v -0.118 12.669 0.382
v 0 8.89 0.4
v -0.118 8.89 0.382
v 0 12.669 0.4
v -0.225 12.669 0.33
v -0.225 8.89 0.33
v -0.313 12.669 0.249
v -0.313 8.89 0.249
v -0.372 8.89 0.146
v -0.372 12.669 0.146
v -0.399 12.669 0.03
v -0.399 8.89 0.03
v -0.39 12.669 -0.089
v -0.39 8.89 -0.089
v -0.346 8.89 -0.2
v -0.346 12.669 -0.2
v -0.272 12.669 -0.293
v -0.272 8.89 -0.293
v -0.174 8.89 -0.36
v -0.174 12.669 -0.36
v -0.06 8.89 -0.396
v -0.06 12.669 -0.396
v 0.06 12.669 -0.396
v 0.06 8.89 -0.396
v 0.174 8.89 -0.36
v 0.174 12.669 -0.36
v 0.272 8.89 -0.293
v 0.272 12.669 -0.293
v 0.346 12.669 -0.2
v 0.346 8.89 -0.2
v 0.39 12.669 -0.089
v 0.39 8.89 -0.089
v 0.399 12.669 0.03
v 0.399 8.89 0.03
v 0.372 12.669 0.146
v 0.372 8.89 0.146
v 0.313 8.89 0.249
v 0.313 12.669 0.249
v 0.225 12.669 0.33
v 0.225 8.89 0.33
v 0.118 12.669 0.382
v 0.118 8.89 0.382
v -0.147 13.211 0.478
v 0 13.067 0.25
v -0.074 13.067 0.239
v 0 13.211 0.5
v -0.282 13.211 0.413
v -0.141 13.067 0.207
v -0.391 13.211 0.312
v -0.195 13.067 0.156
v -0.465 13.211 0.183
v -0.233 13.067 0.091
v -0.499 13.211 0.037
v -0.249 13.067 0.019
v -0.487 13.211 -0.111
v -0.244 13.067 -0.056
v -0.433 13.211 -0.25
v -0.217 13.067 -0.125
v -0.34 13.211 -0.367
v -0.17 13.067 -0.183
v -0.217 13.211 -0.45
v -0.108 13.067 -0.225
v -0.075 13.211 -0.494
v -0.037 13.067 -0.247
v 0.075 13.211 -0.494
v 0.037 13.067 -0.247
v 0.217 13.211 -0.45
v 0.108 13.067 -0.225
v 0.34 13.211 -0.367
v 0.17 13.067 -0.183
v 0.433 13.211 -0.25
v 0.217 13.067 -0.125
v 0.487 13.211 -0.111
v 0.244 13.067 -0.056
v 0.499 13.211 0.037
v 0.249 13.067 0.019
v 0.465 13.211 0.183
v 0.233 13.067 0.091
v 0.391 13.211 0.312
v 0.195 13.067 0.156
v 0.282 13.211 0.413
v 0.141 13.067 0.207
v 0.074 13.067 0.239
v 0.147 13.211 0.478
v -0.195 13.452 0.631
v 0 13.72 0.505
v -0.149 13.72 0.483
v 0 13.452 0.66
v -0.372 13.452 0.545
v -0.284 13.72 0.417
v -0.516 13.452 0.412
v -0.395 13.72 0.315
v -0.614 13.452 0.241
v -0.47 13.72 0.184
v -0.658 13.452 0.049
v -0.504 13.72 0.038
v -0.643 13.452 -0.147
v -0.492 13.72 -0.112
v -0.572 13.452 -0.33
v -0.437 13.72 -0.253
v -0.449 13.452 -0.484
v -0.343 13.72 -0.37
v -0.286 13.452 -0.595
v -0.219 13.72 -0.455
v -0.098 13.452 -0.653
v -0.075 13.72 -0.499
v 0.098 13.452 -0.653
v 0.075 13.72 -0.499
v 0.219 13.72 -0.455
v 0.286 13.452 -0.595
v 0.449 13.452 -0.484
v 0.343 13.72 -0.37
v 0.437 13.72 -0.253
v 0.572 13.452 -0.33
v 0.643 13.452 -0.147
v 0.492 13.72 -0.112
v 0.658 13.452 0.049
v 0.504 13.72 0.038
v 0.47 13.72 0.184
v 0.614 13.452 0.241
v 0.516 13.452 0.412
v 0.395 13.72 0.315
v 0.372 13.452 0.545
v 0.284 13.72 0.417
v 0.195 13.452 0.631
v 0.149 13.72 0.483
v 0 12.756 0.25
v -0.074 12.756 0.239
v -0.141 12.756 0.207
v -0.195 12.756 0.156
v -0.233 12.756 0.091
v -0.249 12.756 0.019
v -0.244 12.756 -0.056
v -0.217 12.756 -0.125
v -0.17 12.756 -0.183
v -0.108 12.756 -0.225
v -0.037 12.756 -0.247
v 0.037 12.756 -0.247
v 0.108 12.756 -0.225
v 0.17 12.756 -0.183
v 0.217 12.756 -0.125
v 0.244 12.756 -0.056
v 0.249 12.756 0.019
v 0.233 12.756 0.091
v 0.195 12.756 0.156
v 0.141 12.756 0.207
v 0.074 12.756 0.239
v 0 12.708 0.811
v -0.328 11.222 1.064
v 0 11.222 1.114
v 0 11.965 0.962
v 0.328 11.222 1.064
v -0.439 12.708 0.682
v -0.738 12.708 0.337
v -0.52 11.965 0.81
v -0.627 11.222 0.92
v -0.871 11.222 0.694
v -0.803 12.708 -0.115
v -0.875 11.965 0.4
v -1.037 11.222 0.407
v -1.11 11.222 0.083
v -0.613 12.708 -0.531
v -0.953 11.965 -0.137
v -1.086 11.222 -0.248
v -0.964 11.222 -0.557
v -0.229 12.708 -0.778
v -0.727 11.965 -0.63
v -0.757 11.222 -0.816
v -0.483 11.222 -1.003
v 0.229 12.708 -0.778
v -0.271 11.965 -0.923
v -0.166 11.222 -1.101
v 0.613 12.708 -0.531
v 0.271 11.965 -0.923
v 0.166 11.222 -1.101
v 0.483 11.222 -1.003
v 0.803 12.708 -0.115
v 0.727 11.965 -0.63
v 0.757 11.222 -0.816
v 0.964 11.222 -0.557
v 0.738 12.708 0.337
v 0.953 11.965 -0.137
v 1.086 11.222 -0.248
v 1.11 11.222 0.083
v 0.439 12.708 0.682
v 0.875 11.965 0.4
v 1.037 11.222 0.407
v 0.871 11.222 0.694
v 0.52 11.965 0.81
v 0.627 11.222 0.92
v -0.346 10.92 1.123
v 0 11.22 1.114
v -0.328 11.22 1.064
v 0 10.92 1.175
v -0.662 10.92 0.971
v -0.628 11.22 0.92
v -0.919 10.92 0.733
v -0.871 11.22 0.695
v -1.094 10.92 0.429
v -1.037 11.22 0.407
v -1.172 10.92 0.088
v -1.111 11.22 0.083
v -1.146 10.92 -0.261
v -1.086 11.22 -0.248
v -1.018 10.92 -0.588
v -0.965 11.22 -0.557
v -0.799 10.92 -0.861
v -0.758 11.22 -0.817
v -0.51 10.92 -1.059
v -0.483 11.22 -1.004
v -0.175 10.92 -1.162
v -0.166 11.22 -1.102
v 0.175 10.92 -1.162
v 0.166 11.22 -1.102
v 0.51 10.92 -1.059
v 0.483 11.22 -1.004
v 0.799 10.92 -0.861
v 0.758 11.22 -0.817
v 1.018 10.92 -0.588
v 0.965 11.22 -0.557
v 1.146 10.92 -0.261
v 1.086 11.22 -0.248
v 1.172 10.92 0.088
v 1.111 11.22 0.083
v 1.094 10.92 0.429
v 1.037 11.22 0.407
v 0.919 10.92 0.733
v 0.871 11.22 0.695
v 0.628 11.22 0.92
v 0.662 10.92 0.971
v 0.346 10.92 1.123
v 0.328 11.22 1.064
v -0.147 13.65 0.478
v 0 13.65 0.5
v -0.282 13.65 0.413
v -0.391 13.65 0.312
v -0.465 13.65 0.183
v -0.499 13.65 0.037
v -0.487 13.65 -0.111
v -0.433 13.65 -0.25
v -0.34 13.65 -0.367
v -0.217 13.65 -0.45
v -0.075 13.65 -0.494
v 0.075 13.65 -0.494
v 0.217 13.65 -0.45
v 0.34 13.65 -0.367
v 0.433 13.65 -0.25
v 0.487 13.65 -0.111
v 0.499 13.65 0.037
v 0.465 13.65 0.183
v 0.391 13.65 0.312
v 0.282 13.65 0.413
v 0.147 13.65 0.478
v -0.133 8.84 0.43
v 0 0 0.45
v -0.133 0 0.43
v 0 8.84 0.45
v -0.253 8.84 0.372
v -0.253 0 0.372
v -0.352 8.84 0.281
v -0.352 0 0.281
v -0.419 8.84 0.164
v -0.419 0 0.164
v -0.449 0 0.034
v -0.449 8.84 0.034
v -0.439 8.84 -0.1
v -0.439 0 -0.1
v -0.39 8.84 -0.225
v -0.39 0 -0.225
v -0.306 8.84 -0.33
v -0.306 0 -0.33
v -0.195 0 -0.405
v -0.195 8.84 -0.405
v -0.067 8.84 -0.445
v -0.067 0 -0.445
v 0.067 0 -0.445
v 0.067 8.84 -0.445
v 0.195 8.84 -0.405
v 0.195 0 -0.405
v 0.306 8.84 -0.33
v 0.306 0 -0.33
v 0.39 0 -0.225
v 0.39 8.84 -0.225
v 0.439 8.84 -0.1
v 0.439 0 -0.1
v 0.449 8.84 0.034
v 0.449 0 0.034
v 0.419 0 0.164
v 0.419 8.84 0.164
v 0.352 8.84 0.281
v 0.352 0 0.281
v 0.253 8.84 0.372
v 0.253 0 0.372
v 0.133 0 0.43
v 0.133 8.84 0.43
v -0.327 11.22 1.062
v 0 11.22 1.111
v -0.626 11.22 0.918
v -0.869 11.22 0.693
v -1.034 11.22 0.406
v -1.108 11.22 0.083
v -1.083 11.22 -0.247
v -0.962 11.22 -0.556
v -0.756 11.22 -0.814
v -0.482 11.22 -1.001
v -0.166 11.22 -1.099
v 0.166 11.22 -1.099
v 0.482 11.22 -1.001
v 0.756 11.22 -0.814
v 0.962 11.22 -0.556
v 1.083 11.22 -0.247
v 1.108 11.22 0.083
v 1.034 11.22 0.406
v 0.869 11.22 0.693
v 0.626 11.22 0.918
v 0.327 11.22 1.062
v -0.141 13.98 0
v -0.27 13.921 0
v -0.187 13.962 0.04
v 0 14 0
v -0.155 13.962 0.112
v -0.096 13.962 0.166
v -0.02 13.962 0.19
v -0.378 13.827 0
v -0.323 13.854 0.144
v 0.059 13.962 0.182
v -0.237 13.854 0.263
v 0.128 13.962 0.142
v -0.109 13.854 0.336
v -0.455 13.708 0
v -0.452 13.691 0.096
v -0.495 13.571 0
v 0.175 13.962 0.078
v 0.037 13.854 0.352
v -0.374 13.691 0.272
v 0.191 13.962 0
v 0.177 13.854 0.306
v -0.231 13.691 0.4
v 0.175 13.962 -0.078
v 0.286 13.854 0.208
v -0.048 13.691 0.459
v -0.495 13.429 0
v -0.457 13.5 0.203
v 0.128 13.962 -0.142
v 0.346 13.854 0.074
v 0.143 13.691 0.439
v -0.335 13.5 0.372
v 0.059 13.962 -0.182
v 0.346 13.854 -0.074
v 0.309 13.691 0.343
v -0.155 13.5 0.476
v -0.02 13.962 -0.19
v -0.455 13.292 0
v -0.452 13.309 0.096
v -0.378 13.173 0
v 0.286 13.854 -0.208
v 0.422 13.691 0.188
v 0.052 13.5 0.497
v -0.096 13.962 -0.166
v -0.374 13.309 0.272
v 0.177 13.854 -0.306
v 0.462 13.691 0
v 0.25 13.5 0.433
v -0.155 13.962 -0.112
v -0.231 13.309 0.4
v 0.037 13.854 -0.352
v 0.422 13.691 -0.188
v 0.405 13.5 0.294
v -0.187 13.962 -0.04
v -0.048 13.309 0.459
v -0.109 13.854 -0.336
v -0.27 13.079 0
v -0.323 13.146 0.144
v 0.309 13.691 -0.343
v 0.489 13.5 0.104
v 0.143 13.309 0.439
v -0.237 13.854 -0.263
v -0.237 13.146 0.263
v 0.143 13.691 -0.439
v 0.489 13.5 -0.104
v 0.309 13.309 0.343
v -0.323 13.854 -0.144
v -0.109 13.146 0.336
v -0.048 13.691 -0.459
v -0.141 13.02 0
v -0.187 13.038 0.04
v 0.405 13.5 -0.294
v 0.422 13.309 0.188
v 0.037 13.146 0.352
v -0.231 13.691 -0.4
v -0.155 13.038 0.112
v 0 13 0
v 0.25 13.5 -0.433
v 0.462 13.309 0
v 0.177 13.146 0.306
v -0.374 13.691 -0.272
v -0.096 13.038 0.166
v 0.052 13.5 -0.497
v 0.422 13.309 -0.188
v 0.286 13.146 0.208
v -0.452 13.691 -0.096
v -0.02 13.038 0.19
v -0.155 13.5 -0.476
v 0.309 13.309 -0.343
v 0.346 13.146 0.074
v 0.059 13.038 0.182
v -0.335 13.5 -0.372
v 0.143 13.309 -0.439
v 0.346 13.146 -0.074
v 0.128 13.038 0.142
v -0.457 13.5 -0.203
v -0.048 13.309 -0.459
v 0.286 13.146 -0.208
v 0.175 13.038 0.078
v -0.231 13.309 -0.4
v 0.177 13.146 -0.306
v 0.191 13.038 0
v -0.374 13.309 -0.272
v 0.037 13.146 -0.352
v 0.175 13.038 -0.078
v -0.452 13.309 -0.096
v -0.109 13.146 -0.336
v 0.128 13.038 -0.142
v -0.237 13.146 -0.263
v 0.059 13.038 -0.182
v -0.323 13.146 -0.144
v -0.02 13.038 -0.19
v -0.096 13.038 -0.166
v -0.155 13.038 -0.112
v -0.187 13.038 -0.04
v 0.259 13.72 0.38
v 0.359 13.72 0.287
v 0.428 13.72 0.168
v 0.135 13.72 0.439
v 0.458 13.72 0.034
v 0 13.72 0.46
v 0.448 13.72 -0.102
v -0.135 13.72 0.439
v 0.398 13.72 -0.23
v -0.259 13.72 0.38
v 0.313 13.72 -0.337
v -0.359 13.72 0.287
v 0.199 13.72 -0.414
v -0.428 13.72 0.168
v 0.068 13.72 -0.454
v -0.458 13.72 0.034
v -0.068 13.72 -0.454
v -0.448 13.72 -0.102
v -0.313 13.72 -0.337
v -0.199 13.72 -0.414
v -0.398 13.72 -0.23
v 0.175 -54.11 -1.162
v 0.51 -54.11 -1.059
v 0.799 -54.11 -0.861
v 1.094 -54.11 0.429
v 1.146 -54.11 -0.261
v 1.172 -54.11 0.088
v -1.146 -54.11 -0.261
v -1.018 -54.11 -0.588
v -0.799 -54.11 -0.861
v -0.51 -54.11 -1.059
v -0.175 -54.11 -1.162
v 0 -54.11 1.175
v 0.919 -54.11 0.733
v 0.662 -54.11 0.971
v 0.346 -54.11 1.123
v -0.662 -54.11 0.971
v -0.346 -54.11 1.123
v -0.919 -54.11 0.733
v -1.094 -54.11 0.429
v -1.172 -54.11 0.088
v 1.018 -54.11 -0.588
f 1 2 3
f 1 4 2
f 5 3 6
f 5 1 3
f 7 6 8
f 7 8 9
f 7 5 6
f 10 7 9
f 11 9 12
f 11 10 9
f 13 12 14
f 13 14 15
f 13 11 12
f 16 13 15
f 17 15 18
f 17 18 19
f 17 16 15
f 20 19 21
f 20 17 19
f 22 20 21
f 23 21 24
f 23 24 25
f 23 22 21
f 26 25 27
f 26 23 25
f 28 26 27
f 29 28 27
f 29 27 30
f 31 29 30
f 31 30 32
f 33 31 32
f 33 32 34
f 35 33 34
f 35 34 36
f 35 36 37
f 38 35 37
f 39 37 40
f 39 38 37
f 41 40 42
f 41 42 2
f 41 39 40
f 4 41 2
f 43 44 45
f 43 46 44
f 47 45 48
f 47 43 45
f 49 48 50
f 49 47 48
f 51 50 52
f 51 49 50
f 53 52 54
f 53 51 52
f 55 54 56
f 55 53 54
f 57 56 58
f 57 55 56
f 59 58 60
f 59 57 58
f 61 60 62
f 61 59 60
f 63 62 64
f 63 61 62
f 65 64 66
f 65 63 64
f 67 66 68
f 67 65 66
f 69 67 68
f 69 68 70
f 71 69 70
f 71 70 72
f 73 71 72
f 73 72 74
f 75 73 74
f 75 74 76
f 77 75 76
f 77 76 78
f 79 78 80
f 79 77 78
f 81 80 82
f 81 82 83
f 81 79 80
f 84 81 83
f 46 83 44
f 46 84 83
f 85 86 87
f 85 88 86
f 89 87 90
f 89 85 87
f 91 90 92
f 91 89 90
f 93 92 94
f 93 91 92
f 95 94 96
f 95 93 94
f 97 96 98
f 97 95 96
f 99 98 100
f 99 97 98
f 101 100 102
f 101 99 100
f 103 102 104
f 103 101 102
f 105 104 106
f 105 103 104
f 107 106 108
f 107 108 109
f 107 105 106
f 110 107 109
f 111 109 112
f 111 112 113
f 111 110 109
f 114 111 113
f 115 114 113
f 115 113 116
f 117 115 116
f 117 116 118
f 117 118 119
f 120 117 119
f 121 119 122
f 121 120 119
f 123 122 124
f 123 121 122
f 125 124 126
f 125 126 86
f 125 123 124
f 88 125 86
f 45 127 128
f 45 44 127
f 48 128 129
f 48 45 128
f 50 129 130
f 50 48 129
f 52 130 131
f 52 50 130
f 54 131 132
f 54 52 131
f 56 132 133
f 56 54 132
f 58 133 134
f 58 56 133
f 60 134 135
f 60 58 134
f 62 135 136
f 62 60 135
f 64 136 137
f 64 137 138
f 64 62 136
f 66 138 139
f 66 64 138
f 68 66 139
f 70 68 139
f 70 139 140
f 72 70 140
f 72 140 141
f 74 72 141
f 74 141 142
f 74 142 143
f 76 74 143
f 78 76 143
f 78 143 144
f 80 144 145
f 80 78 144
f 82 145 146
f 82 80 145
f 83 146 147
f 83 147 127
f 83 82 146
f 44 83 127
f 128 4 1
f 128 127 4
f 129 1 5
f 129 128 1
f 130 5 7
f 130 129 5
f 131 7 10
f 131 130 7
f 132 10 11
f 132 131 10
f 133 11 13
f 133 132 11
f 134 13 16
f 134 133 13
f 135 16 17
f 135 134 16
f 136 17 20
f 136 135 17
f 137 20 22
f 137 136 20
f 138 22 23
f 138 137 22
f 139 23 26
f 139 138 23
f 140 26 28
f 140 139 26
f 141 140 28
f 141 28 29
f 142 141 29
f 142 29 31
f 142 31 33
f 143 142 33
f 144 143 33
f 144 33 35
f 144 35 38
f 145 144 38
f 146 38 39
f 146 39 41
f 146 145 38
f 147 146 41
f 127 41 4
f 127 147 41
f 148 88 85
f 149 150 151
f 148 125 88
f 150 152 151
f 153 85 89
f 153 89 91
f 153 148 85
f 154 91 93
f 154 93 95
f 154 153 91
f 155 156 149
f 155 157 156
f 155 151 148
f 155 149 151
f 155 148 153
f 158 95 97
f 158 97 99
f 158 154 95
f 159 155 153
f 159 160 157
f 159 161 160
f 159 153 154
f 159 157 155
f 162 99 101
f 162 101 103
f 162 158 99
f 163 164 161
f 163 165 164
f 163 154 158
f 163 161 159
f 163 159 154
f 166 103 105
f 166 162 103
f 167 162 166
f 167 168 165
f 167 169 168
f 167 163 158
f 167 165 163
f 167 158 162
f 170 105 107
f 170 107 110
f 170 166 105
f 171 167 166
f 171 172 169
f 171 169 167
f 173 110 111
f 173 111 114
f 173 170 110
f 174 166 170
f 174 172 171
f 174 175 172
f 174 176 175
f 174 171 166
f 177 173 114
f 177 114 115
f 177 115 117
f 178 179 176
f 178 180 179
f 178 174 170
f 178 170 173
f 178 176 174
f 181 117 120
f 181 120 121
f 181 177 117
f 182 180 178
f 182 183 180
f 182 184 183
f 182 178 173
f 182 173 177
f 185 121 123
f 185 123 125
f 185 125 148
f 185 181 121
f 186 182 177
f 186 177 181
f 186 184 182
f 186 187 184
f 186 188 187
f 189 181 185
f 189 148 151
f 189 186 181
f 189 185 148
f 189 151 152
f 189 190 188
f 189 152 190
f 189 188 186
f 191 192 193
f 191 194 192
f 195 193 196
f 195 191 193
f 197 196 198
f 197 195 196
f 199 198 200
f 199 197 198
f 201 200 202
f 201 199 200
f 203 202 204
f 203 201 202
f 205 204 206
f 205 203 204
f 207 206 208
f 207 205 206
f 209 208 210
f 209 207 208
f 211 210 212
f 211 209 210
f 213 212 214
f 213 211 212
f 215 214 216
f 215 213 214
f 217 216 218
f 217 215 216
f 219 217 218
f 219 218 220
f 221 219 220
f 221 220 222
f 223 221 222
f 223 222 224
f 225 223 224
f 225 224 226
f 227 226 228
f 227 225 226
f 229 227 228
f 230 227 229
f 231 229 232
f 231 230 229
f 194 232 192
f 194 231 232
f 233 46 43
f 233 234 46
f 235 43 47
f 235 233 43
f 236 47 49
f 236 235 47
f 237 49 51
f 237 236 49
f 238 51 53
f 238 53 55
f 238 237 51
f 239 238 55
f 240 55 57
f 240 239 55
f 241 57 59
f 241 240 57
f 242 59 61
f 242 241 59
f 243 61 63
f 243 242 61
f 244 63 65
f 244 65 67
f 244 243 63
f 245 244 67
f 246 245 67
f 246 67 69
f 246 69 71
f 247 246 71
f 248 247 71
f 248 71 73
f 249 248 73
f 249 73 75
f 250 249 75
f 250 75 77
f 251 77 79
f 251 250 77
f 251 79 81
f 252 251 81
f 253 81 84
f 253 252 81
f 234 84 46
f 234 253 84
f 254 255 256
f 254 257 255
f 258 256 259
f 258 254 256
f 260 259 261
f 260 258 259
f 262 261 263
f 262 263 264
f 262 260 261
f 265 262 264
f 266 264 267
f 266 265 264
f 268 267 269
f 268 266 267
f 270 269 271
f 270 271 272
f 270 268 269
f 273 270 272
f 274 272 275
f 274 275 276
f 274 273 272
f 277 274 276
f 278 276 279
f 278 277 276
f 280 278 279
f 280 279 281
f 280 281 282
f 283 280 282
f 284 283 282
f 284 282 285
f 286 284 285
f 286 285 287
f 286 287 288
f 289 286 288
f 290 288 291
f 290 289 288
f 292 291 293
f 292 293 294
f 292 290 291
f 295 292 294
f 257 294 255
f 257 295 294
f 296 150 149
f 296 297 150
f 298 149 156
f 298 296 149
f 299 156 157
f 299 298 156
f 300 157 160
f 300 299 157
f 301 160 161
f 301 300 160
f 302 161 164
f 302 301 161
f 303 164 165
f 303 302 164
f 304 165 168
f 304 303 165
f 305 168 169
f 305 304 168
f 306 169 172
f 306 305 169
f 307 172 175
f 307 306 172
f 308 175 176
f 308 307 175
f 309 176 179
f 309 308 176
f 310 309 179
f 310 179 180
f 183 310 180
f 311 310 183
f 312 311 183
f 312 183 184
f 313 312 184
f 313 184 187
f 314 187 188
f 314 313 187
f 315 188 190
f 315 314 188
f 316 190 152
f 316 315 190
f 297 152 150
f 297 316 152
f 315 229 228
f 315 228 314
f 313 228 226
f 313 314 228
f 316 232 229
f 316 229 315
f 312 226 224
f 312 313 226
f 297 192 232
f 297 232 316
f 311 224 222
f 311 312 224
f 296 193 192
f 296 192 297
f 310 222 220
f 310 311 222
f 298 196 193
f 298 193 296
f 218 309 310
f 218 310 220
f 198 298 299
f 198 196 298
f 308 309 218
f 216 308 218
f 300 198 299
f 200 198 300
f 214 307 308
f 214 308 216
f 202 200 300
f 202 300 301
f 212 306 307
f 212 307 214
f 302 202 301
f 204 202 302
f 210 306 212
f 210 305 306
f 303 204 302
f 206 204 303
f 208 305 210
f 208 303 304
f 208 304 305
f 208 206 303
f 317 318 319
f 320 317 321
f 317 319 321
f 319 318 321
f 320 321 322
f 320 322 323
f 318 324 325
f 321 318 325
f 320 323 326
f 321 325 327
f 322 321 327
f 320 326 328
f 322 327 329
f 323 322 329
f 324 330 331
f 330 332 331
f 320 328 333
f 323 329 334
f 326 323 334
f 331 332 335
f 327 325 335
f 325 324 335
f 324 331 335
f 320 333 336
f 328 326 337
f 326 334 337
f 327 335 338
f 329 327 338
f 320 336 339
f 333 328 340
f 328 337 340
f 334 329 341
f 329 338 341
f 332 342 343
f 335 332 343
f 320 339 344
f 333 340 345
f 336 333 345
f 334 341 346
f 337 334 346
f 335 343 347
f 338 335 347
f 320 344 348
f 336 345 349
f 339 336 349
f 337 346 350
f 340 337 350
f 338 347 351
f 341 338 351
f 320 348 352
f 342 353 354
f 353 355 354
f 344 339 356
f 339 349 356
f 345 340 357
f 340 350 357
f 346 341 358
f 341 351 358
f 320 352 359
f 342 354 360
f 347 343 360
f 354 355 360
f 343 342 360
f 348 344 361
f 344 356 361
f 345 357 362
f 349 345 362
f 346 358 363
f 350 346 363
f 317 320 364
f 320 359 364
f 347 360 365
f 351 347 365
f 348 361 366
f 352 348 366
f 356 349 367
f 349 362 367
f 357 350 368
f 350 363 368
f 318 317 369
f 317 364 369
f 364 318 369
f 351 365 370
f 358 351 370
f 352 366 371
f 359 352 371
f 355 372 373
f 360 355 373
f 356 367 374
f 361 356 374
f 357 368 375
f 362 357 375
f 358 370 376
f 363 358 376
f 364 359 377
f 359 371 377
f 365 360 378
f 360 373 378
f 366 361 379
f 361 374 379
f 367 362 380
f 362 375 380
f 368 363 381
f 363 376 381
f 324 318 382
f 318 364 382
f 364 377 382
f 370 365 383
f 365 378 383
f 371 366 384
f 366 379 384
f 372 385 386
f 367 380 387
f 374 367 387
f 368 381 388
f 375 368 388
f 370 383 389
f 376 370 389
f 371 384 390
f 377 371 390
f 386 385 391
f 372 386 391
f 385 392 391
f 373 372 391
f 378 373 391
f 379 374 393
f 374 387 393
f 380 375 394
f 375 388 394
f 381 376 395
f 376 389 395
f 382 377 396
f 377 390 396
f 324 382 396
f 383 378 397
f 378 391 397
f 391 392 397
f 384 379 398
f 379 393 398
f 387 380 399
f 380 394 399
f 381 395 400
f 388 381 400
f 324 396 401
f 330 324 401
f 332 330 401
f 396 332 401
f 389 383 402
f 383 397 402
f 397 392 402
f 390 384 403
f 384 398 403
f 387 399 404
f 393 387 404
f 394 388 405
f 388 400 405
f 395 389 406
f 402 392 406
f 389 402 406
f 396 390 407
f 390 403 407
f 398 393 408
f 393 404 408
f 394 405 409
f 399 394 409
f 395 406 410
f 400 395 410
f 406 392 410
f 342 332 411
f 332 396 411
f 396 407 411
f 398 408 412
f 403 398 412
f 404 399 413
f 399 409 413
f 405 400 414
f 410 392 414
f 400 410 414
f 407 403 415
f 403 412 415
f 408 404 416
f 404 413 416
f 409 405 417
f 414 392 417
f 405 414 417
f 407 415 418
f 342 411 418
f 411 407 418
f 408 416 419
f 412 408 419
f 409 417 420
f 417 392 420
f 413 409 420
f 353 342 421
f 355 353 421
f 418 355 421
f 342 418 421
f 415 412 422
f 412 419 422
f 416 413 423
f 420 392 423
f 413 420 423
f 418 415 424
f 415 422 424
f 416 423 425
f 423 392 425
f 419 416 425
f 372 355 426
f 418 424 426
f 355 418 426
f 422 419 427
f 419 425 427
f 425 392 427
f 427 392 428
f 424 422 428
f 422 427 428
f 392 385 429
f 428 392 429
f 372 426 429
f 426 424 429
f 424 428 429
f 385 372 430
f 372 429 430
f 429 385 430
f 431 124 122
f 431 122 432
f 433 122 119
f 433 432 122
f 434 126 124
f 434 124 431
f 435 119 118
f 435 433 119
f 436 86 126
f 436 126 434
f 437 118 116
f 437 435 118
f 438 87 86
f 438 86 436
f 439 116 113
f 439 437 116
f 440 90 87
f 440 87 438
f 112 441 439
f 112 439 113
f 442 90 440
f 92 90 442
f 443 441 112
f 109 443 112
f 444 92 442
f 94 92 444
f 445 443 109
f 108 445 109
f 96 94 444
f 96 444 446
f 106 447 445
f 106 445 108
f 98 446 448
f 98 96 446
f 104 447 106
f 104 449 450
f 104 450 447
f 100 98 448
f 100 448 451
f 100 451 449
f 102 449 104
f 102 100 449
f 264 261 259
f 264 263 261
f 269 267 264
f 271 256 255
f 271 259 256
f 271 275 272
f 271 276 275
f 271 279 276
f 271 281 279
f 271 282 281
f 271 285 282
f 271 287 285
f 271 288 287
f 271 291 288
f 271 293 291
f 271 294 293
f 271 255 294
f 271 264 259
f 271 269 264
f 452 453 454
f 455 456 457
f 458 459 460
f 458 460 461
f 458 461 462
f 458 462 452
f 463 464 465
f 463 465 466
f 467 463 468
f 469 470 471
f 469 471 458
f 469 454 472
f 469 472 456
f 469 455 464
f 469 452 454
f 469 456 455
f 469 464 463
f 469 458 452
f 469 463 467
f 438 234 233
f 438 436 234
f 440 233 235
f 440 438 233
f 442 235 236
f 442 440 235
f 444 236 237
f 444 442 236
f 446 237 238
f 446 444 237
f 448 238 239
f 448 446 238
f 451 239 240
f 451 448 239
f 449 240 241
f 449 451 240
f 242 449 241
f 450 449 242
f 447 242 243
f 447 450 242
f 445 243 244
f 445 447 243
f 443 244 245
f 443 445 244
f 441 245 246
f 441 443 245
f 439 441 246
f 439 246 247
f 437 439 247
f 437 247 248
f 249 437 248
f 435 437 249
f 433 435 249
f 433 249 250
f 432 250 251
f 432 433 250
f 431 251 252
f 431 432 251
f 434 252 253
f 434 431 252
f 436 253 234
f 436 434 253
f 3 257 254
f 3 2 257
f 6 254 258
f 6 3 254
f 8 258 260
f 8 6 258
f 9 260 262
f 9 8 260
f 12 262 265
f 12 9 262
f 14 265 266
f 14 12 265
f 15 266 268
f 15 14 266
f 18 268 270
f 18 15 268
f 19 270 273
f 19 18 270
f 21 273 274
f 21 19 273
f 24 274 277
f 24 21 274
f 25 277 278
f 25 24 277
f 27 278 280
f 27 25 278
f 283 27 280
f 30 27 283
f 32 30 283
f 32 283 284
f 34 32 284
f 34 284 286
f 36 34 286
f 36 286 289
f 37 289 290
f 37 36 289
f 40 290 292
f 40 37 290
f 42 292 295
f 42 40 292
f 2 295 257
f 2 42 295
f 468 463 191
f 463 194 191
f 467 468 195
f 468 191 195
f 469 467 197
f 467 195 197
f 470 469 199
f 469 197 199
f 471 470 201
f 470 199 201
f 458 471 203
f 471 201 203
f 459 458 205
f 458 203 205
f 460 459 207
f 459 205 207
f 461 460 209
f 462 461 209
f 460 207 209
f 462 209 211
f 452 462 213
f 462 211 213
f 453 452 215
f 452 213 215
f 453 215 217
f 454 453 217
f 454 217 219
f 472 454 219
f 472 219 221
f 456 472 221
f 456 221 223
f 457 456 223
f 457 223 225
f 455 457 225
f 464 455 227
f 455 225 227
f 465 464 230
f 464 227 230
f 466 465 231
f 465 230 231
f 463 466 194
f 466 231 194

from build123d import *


with BuildPart() as part:
    # Sketch1 → Revolve2 (revolve)
    with BuildSketch(Plane(origin=(0, 0, 0), x_dir=(0, 0, -1), z_dir=(1, 0, 0)), mode=Mode.PRIVATE) as revolve2_sk:
        Polygon((0.4, 12.66900418), (0.25, 12.75560672), (0.25, 13.06664991), (0.499999999, 13.210987477), (0.499999999, 13.65), (0.45958548, 13.72), (0.505, 13.72), (0.66, 13.451532125), (1.113571716, 11.22195665), (1.111006501, 11.22), (1.113969765, 11.22), (1.175, 10.92), (1.175, -2.03), (1.175, -54.11), (0, -54.11), (0, 0), (0.45, 0), (0.45, 8.84), (0.4, 8.89), align=None)
    revolve(revolve2_sk.sketch.rotate(Axis((0, 13.79485497, 0), (0, -1, 0)), 180), axis=Axis((0, 13.79485497, 0), (0, -1, 0)))


with BuildPart() as body_2:
    # Esboço1 → Revolução1 (revolve)
    with BuildSketch(Plane.XY):
        with BuildLine():
            Line((0, 13), (0, 14))
            ThreePointArc((0, 14), (-0.5, 13.5), (0, 13))
        make_face()
    revolve(axis=Axis((0, 13, 0), (0, 1, 0)))


solid = Compound([part.part, body_2.part])
